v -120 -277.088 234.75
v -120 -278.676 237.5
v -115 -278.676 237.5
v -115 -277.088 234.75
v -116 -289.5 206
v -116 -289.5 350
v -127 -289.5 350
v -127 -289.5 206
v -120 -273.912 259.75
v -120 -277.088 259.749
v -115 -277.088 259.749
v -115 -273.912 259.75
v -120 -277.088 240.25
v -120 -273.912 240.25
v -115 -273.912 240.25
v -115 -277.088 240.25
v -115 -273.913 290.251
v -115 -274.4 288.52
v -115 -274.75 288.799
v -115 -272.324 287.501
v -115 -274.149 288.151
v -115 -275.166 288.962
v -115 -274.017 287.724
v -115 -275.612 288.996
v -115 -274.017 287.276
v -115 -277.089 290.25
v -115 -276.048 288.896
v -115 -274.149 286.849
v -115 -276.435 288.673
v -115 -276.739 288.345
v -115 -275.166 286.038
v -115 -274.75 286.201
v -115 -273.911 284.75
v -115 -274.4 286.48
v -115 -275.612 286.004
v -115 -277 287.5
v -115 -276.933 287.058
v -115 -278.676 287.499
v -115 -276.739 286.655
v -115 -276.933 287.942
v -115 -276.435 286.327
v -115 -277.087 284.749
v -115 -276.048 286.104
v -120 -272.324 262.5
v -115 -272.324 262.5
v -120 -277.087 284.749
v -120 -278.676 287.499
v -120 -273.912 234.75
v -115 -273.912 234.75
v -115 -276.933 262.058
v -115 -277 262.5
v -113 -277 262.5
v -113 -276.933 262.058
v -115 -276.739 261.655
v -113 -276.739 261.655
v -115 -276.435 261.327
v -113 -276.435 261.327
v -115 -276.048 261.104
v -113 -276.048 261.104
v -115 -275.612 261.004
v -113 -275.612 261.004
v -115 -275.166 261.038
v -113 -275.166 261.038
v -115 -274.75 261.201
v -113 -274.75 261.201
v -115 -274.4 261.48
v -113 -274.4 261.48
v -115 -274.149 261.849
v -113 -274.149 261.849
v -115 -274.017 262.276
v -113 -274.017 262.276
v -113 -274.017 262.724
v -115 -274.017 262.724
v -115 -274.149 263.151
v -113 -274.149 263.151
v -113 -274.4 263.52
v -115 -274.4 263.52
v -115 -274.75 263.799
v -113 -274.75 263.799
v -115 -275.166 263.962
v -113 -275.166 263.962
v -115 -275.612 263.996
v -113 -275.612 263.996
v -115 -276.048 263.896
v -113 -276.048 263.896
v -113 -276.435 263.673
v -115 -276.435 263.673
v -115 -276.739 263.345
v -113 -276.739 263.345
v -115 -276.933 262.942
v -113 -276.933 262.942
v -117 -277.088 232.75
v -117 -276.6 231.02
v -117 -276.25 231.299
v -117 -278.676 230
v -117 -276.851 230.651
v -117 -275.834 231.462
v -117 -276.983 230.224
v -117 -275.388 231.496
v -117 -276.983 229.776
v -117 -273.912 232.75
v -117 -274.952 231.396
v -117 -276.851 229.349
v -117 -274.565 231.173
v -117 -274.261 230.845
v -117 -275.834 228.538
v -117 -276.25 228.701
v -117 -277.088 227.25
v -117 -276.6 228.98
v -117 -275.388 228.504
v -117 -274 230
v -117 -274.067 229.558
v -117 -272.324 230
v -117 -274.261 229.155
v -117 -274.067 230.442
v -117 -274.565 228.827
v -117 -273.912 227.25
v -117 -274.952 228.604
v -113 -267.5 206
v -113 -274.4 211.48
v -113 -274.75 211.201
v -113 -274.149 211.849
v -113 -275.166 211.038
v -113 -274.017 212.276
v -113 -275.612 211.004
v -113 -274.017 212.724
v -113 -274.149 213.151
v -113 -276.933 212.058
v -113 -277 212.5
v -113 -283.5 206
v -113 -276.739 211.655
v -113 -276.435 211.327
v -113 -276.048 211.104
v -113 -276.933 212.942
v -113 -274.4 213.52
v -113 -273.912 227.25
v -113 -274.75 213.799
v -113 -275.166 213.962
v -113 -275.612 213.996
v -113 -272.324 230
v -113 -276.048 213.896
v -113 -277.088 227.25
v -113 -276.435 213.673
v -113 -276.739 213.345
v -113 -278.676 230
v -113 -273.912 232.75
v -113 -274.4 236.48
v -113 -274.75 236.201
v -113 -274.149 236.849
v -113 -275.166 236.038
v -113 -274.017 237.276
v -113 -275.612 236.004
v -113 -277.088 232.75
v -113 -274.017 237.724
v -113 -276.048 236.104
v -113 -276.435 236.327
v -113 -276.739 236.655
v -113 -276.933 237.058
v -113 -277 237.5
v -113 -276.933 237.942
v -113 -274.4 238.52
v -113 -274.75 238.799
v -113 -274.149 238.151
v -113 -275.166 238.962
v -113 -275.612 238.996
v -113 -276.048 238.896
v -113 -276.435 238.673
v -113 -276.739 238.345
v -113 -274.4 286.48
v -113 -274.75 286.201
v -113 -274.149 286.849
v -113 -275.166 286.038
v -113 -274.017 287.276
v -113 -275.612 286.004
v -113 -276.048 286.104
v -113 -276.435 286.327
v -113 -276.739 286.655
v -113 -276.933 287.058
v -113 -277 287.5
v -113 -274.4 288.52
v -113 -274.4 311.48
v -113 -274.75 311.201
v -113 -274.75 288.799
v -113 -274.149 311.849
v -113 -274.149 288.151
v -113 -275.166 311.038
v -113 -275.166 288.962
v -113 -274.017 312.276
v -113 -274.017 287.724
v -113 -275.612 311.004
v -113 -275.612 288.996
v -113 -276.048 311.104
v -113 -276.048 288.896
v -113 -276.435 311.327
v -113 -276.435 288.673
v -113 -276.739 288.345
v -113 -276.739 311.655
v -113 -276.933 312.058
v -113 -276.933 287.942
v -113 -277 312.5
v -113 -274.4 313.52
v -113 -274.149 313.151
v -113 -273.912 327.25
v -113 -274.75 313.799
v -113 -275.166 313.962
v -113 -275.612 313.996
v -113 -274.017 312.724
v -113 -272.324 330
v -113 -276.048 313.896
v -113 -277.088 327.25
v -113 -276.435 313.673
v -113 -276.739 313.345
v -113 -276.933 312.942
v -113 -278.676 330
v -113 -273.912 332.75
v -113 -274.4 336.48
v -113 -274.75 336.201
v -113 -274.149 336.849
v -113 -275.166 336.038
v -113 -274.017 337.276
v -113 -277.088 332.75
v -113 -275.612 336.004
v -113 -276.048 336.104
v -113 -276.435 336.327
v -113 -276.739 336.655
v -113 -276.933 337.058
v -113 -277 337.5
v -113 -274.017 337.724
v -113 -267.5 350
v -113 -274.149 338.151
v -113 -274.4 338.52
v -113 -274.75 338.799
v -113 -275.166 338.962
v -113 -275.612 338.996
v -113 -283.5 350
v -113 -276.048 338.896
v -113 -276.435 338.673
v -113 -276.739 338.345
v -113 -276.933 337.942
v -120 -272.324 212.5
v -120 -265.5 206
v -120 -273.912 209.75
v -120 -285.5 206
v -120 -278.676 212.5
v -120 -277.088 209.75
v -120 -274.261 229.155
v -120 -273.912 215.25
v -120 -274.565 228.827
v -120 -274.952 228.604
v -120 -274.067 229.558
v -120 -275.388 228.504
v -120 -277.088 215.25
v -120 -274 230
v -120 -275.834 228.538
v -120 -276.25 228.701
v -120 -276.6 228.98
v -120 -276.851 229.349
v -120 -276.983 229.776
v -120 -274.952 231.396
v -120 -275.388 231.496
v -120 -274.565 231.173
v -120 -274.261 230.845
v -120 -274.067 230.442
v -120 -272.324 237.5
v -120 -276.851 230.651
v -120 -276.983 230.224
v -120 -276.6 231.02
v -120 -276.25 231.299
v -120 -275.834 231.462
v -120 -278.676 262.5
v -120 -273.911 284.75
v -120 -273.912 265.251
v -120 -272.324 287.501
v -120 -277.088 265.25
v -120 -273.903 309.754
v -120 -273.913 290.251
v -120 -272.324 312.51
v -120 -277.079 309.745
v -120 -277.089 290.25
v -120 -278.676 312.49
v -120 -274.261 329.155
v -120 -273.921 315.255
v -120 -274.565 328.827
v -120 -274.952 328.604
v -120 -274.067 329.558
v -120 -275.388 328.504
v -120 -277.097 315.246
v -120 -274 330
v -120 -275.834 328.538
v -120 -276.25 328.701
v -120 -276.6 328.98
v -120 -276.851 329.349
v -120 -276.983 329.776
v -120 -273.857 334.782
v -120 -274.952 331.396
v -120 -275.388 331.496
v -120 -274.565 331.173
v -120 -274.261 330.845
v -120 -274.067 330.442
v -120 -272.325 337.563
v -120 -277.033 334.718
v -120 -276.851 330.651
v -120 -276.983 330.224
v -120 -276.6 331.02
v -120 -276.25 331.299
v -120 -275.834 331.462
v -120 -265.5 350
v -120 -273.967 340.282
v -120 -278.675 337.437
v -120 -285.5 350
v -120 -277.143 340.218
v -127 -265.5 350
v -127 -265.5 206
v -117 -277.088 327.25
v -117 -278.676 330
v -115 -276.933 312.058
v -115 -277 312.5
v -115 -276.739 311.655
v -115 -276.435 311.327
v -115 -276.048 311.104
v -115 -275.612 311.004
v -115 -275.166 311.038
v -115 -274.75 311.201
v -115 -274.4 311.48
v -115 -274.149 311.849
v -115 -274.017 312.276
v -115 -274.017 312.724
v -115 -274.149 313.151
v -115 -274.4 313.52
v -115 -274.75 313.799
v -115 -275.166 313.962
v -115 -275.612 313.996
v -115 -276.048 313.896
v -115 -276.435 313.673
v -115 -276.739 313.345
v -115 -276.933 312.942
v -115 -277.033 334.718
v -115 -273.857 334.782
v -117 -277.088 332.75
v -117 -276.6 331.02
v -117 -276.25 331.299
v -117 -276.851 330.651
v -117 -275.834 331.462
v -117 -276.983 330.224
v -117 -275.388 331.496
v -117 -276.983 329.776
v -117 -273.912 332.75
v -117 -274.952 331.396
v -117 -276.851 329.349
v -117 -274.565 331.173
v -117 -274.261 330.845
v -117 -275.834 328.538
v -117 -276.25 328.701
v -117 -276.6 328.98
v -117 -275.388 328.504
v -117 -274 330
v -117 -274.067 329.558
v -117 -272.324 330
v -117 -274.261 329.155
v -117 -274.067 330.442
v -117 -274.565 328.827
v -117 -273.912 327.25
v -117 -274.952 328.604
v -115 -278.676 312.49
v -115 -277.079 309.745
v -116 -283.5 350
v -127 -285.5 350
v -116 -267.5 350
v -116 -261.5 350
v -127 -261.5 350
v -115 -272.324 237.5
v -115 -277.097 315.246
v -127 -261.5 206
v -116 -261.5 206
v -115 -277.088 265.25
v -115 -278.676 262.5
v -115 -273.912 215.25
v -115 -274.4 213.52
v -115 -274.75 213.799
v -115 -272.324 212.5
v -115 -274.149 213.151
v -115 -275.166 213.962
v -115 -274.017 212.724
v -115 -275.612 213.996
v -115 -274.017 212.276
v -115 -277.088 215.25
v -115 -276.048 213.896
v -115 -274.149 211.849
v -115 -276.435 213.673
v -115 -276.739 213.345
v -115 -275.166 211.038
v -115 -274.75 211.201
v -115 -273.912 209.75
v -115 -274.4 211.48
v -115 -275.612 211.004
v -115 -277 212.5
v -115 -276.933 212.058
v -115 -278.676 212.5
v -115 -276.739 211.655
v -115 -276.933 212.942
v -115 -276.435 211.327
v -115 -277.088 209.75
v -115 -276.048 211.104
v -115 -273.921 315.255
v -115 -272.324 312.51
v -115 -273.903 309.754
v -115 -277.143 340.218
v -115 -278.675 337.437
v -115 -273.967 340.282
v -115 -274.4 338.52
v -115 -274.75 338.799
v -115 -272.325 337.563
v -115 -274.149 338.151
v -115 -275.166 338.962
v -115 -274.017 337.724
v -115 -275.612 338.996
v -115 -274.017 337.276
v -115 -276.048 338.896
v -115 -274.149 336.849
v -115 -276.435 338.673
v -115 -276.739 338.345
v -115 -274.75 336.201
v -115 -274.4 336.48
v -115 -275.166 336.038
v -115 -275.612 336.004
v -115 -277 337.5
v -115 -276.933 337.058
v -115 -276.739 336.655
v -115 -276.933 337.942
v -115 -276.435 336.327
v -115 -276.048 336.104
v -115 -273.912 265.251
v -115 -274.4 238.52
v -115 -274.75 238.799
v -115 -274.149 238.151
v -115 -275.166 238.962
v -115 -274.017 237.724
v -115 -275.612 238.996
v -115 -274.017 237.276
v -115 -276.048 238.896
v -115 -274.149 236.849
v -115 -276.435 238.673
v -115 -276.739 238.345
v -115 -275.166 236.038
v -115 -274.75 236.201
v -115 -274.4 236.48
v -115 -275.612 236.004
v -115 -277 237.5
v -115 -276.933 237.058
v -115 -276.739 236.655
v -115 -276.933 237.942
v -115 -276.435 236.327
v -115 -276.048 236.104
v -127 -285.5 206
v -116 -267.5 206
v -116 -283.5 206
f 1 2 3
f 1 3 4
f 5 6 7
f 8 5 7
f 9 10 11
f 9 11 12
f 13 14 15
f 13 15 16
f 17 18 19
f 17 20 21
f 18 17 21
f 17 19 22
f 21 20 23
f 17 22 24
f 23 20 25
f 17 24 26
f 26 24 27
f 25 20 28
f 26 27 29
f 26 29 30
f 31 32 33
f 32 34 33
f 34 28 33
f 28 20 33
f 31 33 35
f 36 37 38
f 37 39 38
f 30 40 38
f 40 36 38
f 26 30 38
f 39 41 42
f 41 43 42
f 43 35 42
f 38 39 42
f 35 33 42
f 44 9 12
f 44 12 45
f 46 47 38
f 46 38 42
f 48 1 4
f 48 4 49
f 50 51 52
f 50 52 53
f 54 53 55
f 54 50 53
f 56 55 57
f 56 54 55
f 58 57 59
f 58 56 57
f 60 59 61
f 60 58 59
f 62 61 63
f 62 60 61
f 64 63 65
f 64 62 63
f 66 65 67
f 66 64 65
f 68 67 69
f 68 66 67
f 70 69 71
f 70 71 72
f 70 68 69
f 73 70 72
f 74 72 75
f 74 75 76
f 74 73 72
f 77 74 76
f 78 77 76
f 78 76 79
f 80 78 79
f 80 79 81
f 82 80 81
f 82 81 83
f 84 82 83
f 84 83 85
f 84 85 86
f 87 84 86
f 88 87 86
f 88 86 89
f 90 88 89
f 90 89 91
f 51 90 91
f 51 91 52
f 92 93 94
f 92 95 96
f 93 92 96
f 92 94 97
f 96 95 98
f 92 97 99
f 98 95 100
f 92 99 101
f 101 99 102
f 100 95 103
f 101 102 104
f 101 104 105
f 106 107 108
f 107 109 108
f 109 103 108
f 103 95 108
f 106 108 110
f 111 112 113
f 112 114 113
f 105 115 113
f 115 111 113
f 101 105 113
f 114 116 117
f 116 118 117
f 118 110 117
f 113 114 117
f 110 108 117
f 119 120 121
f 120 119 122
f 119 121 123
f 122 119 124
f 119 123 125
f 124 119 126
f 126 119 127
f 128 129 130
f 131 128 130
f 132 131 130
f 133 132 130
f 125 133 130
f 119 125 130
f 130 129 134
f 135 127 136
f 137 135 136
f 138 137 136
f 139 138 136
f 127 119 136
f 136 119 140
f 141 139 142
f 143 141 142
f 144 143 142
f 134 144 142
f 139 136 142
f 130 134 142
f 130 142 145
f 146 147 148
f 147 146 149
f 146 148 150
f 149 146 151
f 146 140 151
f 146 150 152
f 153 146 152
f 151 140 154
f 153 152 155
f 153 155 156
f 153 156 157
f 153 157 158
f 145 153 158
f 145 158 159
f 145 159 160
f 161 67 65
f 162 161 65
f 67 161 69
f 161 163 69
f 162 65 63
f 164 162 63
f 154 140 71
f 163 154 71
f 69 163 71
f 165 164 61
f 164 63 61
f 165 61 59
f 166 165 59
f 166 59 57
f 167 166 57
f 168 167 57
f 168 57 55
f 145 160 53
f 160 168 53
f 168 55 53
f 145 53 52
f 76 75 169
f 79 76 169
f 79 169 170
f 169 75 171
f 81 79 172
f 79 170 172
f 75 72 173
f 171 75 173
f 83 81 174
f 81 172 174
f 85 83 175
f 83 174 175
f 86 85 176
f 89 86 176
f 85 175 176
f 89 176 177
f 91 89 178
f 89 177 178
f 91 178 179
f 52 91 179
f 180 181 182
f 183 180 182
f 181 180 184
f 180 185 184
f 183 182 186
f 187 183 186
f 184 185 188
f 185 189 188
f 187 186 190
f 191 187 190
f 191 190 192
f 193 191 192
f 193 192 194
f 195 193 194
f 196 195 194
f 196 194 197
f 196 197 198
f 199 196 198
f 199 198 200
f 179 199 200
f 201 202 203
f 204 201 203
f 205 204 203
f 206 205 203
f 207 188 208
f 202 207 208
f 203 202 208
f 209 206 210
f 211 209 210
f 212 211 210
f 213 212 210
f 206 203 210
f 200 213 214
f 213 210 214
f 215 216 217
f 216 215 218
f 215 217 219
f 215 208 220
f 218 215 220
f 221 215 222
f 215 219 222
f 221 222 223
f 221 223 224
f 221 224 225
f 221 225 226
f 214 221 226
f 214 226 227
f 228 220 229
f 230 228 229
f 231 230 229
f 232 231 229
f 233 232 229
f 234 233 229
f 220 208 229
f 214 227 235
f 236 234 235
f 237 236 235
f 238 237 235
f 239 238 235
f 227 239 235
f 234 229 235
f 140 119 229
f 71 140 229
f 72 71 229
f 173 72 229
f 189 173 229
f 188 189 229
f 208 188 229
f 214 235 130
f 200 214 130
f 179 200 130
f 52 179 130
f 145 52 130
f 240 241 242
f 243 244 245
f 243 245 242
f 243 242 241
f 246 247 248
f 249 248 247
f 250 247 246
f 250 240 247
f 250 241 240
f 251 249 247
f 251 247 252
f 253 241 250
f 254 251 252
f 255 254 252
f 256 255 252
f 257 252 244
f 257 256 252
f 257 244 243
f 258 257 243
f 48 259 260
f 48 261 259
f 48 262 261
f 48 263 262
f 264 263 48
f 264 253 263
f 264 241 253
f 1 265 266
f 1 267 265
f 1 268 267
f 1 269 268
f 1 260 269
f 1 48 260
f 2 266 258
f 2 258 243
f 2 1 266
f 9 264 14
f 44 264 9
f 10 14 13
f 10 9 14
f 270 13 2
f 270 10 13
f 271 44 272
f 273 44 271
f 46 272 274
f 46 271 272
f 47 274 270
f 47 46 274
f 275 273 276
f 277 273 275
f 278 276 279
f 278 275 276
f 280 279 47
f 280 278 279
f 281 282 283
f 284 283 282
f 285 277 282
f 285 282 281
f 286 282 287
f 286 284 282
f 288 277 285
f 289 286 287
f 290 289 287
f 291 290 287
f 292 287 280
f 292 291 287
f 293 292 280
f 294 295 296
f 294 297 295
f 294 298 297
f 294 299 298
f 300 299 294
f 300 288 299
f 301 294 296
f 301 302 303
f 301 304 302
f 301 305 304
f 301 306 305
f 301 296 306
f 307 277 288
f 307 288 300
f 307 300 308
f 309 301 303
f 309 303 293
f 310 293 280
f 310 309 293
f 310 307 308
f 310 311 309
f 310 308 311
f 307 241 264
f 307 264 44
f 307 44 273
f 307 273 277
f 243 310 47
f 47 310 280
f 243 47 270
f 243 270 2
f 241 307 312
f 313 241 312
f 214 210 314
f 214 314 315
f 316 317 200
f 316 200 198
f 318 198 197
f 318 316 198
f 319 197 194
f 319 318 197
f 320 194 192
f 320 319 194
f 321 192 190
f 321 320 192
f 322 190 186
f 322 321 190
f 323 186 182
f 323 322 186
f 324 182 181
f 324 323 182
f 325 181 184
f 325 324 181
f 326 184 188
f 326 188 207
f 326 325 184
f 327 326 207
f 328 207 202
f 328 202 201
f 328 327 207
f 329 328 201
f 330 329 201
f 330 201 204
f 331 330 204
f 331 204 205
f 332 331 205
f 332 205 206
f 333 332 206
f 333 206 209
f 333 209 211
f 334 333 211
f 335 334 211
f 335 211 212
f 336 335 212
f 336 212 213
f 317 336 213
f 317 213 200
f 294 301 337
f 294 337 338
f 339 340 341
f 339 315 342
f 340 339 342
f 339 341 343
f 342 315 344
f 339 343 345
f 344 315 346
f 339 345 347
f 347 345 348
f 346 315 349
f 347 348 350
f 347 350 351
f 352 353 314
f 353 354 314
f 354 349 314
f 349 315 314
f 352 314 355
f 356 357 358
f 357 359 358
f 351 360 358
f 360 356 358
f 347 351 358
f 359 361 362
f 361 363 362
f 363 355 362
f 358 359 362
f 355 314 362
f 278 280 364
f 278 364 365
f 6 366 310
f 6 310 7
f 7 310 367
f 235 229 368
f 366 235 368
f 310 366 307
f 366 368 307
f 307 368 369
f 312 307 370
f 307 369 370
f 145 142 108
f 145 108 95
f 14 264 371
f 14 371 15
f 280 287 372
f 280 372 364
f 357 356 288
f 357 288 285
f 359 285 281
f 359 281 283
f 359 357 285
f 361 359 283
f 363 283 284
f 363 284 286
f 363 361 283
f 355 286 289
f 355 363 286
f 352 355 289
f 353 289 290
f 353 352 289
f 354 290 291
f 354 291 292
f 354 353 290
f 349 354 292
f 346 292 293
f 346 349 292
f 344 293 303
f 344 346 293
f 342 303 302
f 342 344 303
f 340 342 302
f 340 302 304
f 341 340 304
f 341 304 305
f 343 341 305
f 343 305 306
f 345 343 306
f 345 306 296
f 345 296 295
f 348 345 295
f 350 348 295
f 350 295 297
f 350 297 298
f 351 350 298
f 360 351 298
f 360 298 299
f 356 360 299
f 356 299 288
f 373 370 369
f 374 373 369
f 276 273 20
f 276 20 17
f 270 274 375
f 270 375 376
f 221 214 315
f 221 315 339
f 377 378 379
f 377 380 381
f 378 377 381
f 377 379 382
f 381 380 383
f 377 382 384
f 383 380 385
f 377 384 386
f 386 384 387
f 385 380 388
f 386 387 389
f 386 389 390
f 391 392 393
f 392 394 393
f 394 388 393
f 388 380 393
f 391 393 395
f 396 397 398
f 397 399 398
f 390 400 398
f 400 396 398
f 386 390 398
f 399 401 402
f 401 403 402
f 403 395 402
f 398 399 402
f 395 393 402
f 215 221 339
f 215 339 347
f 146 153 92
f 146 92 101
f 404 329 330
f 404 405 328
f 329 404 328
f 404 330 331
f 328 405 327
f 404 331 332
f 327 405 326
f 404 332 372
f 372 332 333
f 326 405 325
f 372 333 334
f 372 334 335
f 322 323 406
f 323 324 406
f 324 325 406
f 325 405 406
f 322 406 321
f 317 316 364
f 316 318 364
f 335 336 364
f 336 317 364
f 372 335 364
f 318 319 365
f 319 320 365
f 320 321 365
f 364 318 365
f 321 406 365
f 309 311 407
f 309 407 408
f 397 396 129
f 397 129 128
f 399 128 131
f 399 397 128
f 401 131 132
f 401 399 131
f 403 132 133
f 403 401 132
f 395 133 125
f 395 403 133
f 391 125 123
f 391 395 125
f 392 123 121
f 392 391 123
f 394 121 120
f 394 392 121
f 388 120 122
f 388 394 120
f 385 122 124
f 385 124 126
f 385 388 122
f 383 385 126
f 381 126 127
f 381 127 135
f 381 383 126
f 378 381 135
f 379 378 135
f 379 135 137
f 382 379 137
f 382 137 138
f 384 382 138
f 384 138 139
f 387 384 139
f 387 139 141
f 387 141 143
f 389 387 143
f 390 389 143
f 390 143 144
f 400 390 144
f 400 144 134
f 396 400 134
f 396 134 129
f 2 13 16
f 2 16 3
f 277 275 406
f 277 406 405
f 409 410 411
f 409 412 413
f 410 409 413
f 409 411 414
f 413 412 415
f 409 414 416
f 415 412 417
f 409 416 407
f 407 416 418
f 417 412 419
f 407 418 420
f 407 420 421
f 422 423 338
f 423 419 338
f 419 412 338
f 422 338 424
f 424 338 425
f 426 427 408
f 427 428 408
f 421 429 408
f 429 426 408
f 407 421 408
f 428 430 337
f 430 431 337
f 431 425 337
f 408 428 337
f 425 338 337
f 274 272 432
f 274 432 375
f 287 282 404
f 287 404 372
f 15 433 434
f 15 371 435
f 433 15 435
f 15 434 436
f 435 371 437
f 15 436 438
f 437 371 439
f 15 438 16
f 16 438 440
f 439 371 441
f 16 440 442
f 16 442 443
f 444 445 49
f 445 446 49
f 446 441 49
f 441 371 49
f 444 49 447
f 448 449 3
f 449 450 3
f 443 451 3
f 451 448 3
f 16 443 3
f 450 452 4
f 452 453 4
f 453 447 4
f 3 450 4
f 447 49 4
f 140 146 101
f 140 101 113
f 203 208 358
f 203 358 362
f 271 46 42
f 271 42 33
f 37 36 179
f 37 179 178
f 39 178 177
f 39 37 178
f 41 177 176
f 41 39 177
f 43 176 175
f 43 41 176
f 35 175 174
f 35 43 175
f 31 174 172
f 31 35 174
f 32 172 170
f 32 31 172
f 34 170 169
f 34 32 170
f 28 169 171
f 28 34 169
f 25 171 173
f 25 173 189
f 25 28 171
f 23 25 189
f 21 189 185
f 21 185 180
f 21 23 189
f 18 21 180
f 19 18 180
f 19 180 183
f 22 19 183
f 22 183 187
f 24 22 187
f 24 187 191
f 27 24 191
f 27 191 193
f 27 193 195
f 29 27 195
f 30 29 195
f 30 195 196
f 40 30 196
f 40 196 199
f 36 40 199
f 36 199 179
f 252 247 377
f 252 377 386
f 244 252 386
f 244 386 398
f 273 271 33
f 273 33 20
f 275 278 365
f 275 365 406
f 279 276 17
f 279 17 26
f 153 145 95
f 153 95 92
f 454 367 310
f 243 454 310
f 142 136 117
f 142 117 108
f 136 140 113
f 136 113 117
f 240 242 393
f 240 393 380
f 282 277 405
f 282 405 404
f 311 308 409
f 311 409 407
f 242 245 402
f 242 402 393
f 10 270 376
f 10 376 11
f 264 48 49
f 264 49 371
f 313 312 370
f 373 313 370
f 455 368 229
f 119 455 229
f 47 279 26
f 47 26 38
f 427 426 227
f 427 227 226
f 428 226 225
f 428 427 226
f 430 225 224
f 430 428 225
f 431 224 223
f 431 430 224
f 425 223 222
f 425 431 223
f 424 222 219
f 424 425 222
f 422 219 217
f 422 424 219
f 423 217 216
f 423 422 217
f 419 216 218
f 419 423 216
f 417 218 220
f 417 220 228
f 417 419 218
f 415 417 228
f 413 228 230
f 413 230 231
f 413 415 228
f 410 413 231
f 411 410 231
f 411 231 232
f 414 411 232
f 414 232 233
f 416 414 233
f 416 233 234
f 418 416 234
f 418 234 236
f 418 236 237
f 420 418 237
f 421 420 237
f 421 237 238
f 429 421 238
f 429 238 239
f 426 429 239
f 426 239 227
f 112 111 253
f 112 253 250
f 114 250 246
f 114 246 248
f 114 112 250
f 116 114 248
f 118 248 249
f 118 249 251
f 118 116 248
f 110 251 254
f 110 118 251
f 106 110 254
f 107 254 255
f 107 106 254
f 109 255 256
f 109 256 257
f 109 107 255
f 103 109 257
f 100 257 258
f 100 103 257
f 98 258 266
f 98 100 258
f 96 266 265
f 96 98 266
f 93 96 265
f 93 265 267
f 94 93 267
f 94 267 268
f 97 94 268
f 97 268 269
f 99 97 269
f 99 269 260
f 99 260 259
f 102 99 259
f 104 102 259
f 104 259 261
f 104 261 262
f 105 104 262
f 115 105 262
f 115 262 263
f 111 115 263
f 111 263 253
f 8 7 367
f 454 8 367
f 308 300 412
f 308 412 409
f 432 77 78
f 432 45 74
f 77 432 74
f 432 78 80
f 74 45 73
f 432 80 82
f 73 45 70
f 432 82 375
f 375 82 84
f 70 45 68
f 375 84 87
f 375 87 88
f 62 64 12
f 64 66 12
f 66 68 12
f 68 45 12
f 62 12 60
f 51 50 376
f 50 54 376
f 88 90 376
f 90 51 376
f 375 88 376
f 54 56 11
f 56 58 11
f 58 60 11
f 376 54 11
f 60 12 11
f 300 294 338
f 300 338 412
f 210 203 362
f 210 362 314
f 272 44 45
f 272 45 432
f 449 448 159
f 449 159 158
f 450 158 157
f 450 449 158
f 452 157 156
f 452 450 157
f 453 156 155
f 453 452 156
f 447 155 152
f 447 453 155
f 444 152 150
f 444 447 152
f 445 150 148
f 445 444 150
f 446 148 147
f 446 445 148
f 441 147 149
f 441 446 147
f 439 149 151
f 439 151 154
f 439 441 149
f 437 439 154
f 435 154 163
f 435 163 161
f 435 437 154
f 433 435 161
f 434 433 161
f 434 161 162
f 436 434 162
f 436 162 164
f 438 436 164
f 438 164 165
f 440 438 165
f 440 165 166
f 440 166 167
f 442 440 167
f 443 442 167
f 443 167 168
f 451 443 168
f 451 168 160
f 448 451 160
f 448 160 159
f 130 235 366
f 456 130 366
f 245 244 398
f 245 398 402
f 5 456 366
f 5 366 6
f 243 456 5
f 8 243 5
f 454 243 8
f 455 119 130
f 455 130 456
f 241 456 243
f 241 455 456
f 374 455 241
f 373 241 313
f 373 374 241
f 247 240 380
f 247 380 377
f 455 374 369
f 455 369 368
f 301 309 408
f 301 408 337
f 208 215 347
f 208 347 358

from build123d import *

# Parameters (mm, degrees)
PAD033_DEPTH            = 144
SKETCH060_R             = 1.5
POCKET025_DEPTH         = 7
POCKET026_DEPTH         = 4
SKETCH065_R             = 1.5
POCKET029_DEPTH         = 7
POCKET030_DEPTH         = 5
BODY018_ROLL_ANGLE      = 90
BODY018_PLACEMENT_ANGLE = 180


with BuildPart() as righthigh:
    # Sketch059 → Pad033 (new body)
    with BuildSketch(Plane.XZ):
        Polygon((0, 0), (0, 10), (-7, 10), (-7, 14), (4, 14), (4, 8), (7, 8), (7, -8), (4, -8), (4, -14), (-7, -14), (-7, -10), (0, -10), align=None)
    extrude(amount=PAD033_DEPTH)

    # Sketch060 (on Face6 of Pad033) → Pocket025 (cut)
    with BuildSketch(Plane(origin=(7, 0, 0), x_dir=(0, 0, 1), z_dir=(1, 0, 0))):
        with Locations((0, 120)):
            Circle(SKETCH060_R)
        with Locations((0, 20)):
            Circle(SKETCH060_R)
    extrude(amount=-POCKET025_DEPTH, mode=Mode.SUBTRACT)

    # Sketch061 (on Face12 of Pocket025) → Pocket026 (cut)
    with BuildSketch(Plane(origin=(7, 0, 0), x_dir=(0, 0, 1), z_dir=(1, 0, 0))):
        Polygon((3.176, 20), (1.588, 22.750497), (-1.588, 22.750497), (-3.176, 20), (-1.588, 17.249503), (1.588, 17.249503), align=None)
        Polygon((3.176, 120), (1.588, 122.750497), (-1.588, 122.750497), (-3.176, 120), (-1.588, 117.249503), (1.588, 117.249503), align=None)
    extrude(amount=-POCKET026_DEPTH, mode=Mode.SUBTRACT)

    # Sketch065 (on Face2 of Pocket026) → Pocket029 (cut)
    with BuildSketch(Plane(origin=(0, 0, 0), x_dir=(0, 0, -1), z_dir=(-1, 0, 0))):
        with Locations((0, 12.5)):
            Circle(SKETCH065_R)
        with Locations((0, 37.5)):
            Circle(SKETCH065_R)
        with Locations((0, 62.5)):
            Circle(SKETCH065_R)
        with Locations((0, 87.5)):
            Circle(SKETCH065_R)
        with Locations((0, 112.5)):
            Circle(SKETCH065_R)
        with Locations((0, 137.5)):
            Circle(SKETCH065_R)
    extrude(amount=-POCKET029_DEPTH, mode=Mode.SUBTRACT)

    # Sketch066 → Pocket030 (cut)
    with BuildSketch(Plane(origin=(0, 0, 0), x_dir=(0, 0, -1), z_dir=(-1, 0, 0))):
        Polygon((3.175366, 12.563434), (1.532748, 15.281665), (-1.642619, 15.218231), (-3.175366, 12.436566), (-1.532748, 9.718335), (1.642619, 9.781769), align=None)
        Polygon((3.175984, 37.50994), (1.579384, 40.255453), (-1.5966, 40.245513), (-3.175984, 37.49006), (-1.579384, 34.744547), (1.5966, 34.754487), align=None)
        Polygon((3.176, 62.500829), (1.587282, 65.250911), (-1.588718, 65.250082), (-3.176, 62.499171), (-1.587282, 59.749089), (1.588718, 59.749918), align=None)
        Polygon((3.176, 87.500019), (1.587984, 90.250506), (-1.588016, 90.250487), (-3.176, 87.499981), (-1.587984, 84.749494), (1.588016, 84.749513), align=None)
        Polygon((3.176, 112.5), (1.588, 115.250497), (-1.588, 115.250497), (-3.176, 112.5), (-1.588, 109.749503), (1.588, 109.749503), align=None)
        Polygon((3.176, 137.5), (1.588, 140.250497), (-1.588, 140.250497), (-3.176, 137.5), (-1.588, 134.749503), (1.588, 134.749503), align=None)
    extrude(amount=-POCKET030_DEPTH, mode=Mode.SUBTRACT)


with BuildPart() as righthigh_1:
    # Body018 roll: moved
    add(righthigh.part.rotate(Axis((0, 0, 0), (1, 0, 0)), BODY018_ROLL_ANGLE))


with BuildPart() as righthigh_2:
    # Body018 placement: moved
    add(righthigh_1.part.moved(Location((120, -275.5, 350))).rotate(Axis((120, -275.5, 350), (0, 0, 1)), BODY018_PLACEMENT_ANGLE))


with BuildPart() as lefthigh:
    # Part__Mirroring007: instance of RightHigh
    add(righthigh_2.part.mirror(Plane(origin=(0, 0, 0), x_dir=(0, -1, 0), z_dir=(1, 0, 0))))


solid = lefthigh.part
